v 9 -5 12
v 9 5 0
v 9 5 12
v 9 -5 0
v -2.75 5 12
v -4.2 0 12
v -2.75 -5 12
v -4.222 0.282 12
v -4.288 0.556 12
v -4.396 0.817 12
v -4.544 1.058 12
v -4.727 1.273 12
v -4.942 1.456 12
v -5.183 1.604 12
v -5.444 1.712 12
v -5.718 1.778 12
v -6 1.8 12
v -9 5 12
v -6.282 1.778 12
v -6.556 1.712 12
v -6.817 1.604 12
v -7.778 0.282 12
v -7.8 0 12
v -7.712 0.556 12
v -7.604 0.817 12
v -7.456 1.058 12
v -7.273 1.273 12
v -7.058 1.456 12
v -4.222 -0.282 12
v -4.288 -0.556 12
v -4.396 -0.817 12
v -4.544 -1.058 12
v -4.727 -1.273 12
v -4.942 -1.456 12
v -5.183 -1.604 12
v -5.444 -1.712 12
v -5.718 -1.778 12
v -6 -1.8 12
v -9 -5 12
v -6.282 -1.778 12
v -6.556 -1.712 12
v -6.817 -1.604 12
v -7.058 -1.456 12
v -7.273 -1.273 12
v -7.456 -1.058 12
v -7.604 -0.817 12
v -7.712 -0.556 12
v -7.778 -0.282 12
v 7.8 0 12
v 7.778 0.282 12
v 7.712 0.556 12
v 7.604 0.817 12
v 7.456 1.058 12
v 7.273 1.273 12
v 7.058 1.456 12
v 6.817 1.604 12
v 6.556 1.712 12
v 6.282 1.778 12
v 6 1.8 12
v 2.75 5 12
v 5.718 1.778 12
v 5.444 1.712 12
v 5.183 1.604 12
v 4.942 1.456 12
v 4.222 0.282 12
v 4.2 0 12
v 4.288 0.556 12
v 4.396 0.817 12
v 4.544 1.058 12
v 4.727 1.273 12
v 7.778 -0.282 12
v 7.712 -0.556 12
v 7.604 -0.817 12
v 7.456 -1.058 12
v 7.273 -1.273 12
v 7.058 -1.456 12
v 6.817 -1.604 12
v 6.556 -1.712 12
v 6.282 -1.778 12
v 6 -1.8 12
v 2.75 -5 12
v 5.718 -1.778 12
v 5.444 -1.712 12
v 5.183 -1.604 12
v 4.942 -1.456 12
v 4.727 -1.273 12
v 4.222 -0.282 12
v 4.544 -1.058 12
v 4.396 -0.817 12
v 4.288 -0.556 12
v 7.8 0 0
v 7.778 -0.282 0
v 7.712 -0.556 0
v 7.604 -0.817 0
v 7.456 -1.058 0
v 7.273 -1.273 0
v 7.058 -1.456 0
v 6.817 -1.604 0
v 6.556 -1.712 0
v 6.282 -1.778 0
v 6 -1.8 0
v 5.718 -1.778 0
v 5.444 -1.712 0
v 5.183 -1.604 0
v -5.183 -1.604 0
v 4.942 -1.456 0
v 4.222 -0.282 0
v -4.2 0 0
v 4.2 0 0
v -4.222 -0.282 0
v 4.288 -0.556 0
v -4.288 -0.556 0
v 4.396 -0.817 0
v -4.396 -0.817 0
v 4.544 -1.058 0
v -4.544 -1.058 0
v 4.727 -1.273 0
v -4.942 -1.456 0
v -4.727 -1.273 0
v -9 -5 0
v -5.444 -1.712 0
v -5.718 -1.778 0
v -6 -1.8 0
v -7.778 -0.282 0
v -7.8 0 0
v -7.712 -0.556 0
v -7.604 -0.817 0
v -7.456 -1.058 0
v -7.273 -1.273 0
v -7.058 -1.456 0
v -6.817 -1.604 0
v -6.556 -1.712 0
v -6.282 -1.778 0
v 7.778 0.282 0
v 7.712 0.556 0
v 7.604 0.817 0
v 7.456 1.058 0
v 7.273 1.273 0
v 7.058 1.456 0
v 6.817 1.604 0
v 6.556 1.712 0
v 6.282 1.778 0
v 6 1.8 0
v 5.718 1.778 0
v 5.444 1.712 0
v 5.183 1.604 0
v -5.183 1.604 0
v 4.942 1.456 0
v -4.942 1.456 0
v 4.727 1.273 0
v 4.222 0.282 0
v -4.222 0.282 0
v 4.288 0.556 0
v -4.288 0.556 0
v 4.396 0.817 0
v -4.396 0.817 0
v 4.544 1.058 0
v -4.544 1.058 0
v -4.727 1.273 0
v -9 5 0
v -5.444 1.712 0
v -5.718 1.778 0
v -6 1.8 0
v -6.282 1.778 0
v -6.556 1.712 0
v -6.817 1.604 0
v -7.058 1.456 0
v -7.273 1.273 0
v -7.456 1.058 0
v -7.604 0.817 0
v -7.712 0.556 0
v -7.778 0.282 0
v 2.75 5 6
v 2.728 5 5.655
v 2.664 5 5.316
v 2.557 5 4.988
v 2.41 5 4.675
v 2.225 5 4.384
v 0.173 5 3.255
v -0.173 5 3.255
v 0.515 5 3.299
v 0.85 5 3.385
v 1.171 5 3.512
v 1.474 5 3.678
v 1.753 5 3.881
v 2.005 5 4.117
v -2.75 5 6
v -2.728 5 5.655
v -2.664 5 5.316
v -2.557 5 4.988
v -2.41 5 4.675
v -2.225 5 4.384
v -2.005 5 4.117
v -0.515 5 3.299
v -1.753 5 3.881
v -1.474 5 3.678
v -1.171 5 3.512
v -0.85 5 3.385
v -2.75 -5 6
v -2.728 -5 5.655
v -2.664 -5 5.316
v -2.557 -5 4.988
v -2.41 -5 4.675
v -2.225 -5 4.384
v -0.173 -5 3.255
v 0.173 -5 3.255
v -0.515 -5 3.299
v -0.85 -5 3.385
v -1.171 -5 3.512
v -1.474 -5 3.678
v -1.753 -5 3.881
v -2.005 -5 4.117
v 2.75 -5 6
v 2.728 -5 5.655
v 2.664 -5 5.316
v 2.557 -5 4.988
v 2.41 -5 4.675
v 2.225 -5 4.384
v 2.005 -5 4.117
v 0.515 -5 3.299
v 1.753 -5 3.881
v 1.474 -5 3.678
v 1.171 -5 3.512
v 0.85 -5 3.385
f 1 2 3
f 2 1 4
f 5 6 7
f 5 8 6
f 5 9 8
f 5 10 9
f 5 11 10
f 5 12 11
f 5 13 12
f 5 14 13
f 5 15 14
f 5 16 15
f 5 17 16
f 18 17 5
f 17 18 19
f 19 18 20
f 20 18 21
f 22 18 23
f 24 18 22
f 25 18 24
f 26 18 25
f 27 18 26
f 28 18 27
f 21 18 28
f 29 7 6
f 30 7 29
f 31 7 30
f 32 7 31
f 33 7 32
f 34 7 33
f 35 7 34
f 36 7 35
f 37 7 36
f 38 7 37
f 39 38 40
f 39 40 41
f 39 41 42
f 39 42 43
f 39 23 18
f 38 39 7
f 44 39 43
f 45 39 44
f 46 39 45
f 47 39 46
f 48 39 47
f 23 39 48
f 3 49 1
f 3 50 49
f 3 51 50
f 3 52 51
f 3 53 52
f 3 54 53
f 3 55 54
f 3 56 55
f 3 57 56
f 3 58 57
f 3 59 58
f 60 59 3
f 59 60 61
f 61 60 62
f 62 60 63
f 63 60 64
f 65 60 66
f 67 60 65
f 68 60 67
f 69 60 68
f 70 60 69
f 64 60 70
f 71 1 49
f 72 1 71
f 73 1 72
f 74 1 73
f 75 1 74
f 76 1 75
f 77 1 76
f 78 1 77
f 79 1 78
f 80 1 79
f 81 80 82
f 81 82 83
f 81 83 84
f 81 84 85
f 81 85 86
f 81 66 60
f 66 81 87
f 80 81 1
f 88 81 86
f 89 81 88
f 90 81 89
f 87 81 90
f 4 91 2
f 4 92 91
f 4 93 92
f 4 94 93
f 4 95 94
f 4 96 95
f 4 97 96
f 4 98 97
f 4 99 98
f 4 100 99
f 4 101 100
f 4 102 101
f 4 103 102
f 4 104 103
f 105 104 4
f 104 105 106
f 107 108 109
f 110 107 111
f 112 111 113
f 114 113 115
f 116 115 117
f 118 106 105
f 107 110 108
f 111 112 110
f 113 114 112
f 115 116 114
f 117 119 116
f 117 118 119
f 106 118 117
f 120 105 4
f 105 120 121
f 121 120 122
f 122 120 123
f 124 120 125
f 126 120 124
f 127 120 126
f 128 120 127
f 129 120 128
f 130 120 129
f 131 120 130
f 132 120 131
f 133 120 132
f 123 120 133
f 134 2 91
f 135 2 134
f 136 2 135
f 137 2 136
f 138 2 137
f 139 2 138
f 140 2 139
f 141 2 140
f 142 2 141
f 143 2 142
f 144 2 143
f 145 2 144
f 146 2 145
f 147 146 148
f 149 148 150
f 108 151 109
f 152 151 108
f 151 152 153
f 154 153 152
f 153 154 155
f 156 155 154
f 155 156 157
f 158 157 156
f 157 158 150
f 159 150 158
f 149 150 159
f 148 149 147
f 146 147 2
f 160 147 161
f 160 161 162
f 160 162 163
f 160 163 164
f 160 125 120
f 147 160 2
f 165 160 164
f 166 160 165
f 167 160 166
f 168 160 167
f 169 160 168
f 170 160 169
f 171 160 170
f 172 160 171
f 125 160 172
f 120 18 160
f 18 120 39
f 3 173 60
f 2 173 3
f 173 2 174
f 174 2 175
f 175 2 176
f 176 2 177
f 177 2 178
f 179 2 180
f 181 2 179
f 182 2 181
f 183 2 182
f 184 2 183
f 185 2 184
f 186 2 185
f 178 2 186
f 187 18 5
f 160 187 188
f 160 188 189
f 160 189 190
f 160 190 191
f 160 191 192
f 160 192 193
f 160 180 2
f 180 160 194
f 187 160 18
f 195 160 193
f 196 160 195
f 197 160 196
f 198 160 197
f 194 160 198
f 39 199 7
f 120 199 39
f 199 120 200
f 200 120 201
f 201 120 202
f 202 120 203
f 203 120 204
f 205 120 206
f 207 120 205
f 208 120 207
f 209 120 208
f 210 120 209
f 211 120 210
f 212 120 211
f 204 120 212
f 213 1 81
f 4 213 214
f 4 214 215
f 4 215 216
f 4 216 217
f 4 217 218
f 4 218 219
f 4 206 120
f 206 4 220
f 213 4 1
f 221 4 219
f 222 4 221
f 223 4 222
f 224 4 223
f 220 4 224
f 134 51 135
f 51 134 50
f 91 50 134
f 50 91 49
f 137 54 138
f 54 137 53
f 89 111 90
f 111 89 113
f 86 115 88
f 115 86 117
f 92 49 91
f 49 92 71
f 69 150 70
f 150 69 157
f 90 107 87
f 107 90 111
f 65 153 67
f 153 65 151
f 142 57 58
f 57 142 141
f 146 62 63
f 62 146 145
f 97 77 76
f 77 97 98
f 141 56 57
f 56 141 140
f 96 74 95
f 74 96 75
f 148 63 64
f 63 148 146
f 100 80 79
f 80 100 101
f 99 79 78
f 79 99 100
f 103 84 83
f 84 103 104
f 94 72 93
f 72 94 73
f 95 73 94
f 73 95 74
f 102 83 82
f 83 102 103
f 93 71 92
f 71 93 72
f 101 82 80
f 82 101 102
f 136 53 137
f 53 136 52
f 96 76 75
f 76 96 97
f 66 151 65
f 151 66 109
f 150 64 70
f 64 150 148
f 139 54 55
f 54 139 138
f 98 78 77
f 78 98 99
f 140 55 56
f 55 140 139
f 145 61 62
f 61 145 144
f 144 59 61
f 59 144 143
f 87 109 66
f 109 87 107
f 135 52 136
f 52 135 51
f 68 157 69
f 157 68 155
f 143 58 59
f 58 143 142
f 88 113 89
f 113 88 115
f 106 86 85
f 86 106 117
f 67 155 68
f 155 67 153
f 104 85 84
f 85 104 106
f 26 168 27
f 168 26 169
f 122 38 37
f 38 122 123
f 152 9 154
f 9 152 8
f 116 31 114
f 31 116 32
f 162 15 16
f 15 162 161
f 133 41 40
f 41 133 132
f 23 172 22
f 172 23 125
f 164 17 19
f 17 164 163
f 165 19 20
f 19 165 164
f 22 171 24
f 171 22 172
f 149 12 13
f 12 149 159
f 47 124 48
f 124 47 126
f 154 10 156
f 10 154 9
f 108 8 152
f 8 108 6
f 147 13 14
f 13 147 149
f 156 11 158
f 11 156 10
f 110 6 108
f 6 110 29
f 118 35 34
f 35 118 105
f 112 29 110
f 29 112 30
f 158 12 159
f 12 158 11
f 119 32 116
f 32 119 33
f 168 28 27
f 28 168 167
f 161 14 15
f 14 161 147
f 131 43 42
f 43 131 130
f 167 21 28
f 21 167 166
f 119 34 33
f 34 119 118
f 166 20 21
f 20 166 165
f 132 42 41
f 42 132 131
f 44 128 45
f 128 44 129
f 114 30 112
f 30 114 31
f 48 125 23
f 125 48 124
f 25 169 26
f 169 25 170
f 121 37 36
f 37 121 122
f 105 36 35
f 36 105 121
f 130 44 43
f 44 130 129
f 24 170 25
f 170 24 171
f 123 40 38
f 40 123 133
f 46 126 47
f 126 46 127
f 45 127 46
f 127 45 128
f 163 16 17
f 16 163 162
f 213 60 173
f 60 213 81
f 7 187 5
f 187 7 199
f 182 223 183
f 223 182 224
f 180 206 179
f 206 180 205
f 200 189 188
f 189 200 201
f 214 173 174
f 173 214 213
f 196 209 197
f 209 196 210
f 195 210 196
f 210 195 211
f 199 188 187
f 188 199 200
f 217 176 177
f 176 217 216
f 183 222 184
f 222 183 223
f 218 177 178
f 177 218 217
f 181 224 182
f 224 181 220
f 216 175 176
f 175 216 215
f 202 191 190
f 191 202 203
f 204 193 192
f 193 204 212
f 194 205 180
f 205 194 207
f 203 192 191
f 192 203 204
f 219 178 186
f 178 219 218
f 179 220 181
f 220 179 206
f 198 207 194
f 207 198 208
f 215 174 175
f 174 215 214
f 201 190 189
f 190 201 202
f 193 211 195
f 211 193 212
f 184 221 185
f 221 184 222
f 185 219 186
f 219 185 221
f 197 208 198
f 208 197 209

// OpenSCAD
   spacer_height = 12; //Heights of less than 10 are not recommended
   
   difference(){
   translate([-9,-5,0]) cube([18,10,spacer_height]);
   
   translate([6,0,-1]) cylinder(r=3.6/2,h=spacer_height+2,$fn=40);
   
   translate([-6,0,-1]) cylinder(r=3.6/2,h=spacer_height+2,$fn=40);
   
   translate([-2.75,-7,spacer_height - 6]) cube([5.5,14,7]);
   
   translate([0,6,spacer_height - 6]) rotate([90,0,0]) cylinder(r=5.5/2,h=12,$fn=50);
       
  
   }
 
